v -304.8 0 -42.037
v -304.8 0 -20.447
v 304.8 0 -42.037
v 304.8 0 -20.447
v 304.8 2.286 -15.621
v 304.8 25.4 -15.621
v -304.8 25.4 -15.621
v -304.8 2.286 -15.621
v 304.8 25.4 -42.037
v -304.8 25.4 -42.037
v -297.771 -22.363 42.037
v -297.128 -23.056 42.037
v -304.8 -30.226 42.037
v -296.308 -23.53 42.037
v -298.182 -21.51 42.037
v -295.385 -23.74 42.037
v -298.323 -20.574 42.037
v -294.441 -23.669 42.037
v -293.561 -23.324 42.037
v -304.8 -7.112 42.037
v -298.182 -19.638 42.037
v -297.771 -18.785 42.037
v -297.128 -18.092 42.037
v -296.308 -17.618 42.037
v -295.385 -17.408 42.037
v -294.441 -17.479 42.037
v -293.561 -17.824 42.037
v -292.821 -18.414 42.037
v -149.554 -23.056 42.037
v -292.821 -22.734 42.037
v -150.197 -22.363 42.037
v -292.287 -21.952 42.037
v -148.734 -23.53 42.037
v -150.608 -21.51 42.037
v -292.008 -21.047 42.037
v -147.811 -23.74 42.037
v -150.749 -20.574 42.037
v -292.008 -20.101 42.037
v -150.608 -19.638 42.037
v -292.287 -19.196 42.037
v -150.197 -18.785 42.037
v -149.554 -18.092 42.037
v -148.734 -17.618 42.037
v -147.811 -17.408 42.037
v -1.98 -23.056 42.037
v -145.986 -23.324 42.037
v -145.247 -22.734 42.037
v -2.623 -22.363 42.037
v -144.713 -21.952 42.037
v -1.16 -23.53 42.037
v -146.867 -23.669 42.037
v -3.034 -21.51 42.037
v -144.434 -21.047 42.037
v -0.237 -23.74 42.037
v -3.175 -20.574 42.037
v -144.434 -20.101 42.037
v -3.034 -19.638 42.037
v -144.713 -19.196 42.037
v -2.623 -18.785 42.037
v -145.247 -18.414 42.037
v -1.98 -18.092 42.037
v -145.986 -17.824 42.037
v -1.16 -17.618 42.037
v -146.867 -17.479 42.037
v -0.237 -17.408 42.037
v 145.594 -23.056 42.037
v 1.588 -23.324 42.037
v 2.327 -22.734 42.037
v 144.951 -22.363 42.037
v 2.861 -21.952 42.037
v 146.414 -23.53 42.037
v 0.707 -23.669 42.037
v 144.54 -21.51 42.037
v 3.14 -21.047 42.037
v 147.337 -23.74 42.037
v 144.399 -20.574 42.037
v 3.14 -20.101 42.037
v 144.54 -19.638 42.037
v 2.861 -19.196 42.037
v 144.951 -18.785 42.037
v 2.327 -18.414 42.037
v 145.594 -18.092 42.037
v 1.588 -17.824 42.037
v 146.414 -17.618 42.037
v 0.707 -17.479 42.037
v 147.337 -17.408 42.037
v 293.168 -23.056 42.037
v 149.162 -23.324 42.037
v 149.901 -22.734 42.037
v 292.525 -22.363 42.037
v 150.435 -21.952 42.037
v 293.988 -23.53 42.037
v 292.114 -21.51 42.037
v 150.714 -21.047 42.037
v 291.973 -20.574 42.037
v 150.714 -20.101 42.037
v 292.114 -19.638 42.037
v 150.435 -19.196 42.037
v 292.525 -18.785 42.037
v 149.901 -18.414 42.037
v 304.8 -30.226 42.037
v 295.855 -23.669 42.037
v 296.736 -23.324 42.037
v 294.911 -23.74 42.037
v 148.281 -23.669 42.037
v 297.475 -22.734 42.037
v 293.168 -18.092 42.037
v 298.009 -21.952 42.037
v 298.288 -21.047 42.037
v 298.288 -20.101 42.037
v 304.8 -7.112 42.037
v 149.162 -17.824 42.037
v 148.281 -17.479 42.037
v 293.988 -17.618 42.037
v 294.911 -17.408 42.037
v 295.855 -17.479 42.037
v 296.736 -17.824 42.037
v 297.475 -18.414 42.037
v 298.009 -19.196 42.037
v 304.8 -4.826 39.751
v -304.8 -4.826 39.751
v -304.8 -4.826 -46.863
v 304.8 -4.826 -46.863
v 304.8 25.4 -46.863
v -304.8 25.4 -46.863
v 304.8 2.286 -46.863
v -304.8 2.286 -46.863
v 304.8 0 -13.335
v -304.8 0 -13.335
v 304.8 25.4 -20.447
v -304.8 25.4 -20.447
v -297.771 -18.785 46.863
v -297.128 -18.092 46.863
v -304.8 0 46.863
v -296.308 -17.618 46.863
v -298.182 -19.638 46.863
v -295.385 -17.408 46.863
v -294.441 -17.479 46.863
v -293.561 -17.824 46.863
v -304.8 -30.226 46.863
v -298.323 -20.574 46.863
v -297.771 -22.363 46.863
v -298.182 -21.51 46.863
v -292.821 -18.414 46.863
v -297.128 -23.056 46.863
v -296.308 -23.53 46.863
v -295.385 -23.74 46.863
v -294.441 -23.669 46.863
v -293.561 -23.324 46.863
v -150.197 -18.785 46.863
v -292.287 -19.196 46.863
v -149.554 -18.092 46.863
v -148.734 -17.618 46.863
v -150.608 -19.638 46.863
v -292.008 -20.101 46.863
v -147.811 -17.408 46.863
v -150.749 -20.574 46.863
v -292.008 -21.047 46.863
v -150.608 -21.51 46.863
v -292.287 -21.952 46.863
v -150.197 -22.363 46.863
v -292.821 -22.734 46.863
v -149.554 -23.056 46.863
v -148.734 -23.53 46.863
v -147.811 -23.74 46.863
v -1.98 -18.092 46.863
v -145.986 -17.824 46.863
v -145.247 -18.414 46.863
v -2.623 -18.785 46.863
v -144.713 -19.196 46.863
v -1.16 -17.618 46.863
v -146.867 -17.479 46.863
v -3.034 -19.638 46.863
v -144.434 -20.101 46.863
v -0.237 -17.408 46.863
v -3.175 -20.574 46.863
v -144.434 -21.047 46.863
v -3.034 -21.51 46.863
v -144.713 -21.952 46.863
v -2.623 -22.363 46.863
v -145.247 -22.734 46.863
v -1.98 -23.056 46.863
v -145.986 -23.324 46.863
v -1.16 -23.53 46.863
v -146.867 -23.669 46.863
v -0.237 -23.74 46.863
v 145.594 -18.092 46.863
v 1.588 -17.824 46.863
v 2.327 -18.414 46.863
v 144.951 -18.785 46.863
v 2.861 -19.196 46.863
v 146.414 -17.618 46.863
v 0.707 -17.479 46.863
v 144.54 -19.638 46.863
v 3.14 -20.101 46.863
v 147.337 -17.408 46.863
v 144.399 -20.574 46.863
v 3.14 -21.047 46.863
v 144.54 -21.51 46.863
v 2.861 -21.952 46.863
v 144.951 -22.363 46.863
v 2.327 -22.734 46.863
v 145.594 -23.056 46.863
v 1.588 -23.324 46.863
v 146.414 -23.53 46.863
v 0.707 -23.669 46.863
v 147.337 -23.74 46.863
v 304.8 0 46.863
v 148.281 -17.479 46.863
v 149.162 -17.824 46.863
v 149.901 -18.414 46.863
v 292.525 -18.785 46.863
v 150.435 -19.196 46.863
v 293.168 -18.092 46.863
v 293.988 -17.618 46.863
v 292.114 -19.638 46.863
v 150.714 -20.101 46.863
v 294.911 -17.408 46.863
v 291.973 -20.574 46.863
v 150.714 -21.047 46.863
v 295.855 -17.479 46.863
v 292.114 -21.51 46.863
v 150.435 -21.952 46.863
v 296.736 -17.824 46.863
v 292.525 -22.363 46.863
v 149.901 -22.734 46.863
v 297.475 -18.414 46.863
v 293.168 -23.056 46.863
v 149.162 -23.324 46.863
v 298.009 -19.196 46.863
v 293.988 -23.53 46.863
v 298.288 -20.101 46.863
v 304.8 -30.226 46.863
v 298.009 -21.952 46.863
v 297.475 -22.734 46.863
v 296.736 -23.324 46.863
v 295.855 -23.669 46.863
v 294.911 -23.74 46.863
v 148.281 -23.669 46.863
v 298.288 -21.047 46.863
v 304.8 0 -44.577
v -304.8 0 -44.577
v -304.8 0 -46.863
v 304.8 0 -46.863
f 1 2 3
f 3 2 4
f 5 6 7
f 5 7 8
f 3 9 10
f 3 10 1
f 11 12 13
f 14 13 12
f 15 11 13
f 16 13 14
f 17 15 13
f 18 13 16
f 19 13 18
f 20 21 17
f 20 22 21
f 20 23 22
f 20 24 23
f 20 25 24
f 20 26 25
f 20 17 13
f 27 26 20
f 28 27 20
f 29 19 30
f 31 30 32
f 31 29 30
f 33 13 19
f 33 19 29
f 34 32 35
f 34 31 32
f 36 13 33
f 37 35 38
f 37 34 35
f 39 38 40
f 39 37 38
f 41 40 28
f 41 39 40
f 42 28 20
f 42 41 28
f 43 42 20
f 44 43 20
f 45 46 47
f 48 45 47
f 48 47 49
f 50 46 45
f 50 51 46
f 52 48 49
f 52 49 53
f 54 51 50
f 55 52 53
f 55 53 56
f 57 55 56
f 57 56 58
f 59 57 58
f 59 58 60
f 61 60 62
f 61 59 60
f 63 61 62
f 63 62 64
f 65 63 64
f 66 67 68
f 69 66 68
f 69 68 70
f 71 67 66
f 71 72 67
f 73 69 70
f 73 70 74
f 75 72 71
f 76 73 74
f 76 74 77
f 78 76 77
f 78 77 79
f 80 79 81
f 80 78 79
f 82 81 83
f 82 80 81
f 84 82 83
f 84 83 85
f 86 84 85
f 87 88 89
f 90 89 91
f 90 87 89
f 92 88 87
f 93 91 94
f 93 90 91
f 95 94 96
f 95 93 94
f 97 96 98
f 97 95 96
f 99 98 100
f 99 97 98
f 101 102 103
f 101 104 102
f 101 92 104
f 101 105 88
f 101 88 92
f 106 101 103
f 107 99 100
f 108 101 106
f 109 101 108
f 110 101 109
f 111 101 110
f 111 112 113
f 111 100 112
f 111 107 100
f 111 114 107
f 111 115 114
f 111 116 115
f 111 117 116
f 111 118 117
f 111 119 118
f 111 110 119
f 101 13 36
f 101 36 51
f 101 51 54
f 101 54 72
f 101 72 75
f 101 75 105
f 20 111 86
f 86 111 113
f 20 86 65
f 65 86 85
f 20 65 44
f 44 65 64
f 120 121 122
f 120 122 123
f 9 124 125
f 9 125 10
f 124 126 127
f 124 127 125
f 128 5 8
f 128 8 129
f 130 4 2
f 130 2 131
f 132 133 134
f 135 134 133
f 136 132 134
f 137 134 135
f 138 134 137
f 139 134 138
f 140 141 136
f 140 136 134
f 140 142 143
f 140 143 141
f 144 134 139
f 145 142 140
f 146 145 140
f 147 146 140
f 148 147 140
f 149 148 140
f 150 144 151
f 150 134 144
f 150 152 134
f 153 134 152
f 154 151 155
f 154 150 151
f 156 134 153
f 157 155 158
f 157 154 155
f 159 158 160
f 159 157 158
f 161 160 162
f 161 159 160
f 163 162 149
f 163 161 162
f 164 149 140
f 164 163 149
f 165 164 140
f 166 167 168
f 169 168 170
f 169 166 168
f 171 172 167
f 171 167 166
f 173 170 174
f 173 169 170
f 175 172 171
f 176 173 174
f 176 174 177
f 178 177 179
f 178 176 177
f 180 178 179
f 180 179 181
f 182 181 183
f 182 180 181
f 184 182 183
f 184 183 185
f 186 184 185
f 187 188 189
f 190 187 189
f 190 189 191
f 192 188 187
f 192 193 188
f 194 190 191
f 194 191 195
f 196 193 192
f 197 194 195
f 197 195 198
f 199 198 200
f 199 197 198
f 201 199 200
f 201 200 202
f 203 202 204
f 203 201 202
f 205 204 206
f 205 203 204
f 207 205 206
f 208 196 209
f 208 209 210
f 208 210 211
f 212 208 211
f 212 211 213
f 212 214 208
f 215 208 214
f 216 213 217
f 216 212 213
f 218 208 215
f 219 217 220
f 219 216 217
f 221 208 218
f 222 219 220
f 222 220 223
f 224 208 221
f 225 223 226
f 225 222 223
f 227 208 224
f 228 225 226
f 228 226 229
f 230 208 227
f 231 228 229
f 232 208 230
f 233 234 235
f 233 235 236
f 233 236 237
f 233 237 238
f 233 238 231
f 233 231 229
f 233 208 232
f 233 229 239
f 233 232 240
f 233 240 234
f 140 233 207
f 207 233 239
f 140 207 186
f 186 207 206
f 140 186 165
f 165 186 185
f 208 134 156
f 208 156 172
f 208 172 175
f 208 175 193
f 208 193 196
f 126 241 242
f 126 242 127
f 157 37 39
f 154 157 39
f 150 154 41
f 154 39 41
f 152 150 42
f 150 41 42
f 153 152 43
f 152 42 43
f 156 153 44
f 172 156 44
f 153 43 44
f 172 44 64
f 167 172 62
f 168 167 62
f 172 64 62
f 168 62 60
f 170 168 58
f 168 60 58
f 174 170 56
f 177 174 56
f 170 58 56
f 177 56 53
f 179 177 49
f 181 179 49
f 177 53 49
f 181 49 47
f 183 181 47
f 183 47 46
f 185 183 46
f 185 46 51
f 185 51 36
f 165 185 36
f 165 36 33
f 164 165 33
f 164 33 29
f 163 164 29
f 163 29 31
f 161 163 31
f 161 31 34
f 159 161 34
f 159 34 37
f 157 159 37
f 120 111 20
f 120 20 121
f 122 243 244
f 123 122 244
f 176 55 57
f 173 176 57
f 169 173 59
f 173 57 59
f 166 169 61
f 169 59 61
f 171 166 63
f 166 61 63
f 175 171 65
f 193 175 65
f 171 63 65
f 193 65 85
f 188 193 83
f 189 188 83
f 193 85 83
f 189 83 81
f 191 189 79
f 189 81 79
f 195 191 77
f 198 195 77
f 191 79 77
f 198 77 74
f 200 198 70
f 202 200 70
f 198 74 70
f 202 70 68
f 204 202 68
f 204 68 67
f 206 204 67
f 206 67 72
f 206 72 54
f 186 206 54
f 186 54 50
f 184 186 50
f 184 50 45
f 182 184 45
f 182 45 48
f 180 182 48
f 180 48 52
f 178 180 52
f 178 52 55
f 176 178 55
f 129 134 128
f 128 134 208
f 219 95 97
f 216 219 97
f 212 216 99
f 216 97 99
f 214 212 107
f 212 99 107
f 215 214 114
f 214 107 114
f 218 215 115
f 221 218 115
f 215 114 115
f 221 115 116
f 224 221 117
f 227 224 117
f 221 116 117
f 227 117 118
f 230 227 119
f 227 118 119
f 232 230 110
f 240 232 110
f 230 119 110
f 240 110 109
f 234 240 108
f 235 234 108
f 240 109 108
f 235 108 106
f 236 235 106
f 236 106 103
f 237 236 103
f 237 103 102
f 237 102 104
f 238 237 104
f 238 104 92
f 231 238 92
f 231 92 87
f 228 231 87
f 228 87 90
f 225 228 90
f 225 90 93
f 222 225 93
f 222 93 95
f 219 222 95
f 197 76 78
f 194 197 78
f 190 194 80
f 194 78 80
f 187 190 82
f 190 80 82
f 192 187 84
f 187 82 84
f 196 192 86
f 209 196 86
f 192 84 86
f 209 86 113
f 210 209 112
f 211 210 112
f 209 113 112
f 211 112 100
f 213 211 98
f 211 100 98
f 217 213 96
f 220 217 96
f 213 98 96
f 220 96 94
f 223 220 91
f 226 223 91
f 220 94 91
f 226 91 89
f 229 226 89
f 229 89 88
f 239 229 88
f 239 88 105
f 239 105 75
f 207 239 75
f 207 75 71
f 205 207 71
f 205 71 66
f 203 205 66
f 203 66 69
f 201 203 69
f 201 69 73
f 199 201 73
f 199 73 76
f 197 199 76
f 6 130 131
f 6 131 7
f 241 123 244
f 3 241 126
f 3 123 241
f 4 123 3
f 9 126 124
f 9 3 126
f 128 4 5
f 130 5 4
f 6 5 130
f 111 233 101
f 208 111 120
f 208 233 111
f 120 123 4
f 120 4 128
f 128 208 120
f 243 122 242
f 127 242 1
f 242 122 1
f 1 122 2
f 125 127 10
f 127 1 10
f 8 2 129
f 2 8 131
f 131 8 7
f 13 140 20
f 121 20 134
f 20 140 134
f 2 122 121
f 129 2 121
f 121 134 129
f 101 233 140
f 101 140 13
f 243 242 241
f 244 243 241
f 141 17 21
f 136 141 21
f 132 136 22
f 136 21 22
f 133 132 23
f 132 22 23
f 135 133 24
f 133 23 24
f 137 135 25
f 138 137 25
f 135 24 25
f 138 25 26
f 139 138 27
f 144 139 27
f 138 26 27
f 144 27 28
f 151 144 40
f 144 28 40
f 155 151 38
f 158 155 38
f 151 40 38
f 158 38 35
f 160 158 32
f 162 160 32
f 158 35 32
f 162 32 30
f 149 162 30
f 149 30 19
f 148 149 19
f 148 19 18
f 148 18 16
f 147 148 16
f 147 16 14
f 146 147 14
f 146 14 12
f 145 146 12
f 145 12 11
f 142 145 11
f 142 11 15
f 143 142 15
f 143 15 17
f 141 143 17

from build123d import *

# Parameters (mm, degrees)
F0_W     = 609.6
F0_H     = 93.726
F1_DEPTH = 4.826
F3_DEPTH = 609.6
F5_D     = 6.35


with BuildPart() as f1:
    # F0 (on Front) → F1 (new body)
    with BuildSketch(Plane.XZ):
        Rectangle(F0_W, F0_H)
    extrude(amount=F1_DEPTH)

    # F2 (on face) → F3 (join, through all)
    with BuildSketch(Plane.YZ.offset(304.8)):
        Polygon((0, -13.335), (0, -15.621), (2.286, -15.621), align=None)
        Polygon((0, -15.621), (0, -20.447), (25.4, -20.447), (25.4, -15.621), (2.286, -15.621), align=None)
        Polygon((-30.226, 42.037), (-7.112, 42.037), (-4.826, 42.037), (-4.826, 46.863), (-30.226, 46.863), align=None)
        Polygon((0, -44.577), (2.286, -46.863), (25.4, -46.863), (25.4, -42.037), (0, -42.037), align=None)
        Polygon((-7.112, 42.037), (-4.826, 39.751), (-4.826, 42.037), align=None)
    extrude(amount=-F3_DEPTH)

    # F5 (through all)
    with Locations(Plane.XY.offset(46.863)):
        with Locations((-295.148, -20.574), (-147.574, -20.574), (0, -20.574), (147.574, -20.574), (295.148, -20.574)):
            Hole(F5_D / 2)


solid = f1.part
